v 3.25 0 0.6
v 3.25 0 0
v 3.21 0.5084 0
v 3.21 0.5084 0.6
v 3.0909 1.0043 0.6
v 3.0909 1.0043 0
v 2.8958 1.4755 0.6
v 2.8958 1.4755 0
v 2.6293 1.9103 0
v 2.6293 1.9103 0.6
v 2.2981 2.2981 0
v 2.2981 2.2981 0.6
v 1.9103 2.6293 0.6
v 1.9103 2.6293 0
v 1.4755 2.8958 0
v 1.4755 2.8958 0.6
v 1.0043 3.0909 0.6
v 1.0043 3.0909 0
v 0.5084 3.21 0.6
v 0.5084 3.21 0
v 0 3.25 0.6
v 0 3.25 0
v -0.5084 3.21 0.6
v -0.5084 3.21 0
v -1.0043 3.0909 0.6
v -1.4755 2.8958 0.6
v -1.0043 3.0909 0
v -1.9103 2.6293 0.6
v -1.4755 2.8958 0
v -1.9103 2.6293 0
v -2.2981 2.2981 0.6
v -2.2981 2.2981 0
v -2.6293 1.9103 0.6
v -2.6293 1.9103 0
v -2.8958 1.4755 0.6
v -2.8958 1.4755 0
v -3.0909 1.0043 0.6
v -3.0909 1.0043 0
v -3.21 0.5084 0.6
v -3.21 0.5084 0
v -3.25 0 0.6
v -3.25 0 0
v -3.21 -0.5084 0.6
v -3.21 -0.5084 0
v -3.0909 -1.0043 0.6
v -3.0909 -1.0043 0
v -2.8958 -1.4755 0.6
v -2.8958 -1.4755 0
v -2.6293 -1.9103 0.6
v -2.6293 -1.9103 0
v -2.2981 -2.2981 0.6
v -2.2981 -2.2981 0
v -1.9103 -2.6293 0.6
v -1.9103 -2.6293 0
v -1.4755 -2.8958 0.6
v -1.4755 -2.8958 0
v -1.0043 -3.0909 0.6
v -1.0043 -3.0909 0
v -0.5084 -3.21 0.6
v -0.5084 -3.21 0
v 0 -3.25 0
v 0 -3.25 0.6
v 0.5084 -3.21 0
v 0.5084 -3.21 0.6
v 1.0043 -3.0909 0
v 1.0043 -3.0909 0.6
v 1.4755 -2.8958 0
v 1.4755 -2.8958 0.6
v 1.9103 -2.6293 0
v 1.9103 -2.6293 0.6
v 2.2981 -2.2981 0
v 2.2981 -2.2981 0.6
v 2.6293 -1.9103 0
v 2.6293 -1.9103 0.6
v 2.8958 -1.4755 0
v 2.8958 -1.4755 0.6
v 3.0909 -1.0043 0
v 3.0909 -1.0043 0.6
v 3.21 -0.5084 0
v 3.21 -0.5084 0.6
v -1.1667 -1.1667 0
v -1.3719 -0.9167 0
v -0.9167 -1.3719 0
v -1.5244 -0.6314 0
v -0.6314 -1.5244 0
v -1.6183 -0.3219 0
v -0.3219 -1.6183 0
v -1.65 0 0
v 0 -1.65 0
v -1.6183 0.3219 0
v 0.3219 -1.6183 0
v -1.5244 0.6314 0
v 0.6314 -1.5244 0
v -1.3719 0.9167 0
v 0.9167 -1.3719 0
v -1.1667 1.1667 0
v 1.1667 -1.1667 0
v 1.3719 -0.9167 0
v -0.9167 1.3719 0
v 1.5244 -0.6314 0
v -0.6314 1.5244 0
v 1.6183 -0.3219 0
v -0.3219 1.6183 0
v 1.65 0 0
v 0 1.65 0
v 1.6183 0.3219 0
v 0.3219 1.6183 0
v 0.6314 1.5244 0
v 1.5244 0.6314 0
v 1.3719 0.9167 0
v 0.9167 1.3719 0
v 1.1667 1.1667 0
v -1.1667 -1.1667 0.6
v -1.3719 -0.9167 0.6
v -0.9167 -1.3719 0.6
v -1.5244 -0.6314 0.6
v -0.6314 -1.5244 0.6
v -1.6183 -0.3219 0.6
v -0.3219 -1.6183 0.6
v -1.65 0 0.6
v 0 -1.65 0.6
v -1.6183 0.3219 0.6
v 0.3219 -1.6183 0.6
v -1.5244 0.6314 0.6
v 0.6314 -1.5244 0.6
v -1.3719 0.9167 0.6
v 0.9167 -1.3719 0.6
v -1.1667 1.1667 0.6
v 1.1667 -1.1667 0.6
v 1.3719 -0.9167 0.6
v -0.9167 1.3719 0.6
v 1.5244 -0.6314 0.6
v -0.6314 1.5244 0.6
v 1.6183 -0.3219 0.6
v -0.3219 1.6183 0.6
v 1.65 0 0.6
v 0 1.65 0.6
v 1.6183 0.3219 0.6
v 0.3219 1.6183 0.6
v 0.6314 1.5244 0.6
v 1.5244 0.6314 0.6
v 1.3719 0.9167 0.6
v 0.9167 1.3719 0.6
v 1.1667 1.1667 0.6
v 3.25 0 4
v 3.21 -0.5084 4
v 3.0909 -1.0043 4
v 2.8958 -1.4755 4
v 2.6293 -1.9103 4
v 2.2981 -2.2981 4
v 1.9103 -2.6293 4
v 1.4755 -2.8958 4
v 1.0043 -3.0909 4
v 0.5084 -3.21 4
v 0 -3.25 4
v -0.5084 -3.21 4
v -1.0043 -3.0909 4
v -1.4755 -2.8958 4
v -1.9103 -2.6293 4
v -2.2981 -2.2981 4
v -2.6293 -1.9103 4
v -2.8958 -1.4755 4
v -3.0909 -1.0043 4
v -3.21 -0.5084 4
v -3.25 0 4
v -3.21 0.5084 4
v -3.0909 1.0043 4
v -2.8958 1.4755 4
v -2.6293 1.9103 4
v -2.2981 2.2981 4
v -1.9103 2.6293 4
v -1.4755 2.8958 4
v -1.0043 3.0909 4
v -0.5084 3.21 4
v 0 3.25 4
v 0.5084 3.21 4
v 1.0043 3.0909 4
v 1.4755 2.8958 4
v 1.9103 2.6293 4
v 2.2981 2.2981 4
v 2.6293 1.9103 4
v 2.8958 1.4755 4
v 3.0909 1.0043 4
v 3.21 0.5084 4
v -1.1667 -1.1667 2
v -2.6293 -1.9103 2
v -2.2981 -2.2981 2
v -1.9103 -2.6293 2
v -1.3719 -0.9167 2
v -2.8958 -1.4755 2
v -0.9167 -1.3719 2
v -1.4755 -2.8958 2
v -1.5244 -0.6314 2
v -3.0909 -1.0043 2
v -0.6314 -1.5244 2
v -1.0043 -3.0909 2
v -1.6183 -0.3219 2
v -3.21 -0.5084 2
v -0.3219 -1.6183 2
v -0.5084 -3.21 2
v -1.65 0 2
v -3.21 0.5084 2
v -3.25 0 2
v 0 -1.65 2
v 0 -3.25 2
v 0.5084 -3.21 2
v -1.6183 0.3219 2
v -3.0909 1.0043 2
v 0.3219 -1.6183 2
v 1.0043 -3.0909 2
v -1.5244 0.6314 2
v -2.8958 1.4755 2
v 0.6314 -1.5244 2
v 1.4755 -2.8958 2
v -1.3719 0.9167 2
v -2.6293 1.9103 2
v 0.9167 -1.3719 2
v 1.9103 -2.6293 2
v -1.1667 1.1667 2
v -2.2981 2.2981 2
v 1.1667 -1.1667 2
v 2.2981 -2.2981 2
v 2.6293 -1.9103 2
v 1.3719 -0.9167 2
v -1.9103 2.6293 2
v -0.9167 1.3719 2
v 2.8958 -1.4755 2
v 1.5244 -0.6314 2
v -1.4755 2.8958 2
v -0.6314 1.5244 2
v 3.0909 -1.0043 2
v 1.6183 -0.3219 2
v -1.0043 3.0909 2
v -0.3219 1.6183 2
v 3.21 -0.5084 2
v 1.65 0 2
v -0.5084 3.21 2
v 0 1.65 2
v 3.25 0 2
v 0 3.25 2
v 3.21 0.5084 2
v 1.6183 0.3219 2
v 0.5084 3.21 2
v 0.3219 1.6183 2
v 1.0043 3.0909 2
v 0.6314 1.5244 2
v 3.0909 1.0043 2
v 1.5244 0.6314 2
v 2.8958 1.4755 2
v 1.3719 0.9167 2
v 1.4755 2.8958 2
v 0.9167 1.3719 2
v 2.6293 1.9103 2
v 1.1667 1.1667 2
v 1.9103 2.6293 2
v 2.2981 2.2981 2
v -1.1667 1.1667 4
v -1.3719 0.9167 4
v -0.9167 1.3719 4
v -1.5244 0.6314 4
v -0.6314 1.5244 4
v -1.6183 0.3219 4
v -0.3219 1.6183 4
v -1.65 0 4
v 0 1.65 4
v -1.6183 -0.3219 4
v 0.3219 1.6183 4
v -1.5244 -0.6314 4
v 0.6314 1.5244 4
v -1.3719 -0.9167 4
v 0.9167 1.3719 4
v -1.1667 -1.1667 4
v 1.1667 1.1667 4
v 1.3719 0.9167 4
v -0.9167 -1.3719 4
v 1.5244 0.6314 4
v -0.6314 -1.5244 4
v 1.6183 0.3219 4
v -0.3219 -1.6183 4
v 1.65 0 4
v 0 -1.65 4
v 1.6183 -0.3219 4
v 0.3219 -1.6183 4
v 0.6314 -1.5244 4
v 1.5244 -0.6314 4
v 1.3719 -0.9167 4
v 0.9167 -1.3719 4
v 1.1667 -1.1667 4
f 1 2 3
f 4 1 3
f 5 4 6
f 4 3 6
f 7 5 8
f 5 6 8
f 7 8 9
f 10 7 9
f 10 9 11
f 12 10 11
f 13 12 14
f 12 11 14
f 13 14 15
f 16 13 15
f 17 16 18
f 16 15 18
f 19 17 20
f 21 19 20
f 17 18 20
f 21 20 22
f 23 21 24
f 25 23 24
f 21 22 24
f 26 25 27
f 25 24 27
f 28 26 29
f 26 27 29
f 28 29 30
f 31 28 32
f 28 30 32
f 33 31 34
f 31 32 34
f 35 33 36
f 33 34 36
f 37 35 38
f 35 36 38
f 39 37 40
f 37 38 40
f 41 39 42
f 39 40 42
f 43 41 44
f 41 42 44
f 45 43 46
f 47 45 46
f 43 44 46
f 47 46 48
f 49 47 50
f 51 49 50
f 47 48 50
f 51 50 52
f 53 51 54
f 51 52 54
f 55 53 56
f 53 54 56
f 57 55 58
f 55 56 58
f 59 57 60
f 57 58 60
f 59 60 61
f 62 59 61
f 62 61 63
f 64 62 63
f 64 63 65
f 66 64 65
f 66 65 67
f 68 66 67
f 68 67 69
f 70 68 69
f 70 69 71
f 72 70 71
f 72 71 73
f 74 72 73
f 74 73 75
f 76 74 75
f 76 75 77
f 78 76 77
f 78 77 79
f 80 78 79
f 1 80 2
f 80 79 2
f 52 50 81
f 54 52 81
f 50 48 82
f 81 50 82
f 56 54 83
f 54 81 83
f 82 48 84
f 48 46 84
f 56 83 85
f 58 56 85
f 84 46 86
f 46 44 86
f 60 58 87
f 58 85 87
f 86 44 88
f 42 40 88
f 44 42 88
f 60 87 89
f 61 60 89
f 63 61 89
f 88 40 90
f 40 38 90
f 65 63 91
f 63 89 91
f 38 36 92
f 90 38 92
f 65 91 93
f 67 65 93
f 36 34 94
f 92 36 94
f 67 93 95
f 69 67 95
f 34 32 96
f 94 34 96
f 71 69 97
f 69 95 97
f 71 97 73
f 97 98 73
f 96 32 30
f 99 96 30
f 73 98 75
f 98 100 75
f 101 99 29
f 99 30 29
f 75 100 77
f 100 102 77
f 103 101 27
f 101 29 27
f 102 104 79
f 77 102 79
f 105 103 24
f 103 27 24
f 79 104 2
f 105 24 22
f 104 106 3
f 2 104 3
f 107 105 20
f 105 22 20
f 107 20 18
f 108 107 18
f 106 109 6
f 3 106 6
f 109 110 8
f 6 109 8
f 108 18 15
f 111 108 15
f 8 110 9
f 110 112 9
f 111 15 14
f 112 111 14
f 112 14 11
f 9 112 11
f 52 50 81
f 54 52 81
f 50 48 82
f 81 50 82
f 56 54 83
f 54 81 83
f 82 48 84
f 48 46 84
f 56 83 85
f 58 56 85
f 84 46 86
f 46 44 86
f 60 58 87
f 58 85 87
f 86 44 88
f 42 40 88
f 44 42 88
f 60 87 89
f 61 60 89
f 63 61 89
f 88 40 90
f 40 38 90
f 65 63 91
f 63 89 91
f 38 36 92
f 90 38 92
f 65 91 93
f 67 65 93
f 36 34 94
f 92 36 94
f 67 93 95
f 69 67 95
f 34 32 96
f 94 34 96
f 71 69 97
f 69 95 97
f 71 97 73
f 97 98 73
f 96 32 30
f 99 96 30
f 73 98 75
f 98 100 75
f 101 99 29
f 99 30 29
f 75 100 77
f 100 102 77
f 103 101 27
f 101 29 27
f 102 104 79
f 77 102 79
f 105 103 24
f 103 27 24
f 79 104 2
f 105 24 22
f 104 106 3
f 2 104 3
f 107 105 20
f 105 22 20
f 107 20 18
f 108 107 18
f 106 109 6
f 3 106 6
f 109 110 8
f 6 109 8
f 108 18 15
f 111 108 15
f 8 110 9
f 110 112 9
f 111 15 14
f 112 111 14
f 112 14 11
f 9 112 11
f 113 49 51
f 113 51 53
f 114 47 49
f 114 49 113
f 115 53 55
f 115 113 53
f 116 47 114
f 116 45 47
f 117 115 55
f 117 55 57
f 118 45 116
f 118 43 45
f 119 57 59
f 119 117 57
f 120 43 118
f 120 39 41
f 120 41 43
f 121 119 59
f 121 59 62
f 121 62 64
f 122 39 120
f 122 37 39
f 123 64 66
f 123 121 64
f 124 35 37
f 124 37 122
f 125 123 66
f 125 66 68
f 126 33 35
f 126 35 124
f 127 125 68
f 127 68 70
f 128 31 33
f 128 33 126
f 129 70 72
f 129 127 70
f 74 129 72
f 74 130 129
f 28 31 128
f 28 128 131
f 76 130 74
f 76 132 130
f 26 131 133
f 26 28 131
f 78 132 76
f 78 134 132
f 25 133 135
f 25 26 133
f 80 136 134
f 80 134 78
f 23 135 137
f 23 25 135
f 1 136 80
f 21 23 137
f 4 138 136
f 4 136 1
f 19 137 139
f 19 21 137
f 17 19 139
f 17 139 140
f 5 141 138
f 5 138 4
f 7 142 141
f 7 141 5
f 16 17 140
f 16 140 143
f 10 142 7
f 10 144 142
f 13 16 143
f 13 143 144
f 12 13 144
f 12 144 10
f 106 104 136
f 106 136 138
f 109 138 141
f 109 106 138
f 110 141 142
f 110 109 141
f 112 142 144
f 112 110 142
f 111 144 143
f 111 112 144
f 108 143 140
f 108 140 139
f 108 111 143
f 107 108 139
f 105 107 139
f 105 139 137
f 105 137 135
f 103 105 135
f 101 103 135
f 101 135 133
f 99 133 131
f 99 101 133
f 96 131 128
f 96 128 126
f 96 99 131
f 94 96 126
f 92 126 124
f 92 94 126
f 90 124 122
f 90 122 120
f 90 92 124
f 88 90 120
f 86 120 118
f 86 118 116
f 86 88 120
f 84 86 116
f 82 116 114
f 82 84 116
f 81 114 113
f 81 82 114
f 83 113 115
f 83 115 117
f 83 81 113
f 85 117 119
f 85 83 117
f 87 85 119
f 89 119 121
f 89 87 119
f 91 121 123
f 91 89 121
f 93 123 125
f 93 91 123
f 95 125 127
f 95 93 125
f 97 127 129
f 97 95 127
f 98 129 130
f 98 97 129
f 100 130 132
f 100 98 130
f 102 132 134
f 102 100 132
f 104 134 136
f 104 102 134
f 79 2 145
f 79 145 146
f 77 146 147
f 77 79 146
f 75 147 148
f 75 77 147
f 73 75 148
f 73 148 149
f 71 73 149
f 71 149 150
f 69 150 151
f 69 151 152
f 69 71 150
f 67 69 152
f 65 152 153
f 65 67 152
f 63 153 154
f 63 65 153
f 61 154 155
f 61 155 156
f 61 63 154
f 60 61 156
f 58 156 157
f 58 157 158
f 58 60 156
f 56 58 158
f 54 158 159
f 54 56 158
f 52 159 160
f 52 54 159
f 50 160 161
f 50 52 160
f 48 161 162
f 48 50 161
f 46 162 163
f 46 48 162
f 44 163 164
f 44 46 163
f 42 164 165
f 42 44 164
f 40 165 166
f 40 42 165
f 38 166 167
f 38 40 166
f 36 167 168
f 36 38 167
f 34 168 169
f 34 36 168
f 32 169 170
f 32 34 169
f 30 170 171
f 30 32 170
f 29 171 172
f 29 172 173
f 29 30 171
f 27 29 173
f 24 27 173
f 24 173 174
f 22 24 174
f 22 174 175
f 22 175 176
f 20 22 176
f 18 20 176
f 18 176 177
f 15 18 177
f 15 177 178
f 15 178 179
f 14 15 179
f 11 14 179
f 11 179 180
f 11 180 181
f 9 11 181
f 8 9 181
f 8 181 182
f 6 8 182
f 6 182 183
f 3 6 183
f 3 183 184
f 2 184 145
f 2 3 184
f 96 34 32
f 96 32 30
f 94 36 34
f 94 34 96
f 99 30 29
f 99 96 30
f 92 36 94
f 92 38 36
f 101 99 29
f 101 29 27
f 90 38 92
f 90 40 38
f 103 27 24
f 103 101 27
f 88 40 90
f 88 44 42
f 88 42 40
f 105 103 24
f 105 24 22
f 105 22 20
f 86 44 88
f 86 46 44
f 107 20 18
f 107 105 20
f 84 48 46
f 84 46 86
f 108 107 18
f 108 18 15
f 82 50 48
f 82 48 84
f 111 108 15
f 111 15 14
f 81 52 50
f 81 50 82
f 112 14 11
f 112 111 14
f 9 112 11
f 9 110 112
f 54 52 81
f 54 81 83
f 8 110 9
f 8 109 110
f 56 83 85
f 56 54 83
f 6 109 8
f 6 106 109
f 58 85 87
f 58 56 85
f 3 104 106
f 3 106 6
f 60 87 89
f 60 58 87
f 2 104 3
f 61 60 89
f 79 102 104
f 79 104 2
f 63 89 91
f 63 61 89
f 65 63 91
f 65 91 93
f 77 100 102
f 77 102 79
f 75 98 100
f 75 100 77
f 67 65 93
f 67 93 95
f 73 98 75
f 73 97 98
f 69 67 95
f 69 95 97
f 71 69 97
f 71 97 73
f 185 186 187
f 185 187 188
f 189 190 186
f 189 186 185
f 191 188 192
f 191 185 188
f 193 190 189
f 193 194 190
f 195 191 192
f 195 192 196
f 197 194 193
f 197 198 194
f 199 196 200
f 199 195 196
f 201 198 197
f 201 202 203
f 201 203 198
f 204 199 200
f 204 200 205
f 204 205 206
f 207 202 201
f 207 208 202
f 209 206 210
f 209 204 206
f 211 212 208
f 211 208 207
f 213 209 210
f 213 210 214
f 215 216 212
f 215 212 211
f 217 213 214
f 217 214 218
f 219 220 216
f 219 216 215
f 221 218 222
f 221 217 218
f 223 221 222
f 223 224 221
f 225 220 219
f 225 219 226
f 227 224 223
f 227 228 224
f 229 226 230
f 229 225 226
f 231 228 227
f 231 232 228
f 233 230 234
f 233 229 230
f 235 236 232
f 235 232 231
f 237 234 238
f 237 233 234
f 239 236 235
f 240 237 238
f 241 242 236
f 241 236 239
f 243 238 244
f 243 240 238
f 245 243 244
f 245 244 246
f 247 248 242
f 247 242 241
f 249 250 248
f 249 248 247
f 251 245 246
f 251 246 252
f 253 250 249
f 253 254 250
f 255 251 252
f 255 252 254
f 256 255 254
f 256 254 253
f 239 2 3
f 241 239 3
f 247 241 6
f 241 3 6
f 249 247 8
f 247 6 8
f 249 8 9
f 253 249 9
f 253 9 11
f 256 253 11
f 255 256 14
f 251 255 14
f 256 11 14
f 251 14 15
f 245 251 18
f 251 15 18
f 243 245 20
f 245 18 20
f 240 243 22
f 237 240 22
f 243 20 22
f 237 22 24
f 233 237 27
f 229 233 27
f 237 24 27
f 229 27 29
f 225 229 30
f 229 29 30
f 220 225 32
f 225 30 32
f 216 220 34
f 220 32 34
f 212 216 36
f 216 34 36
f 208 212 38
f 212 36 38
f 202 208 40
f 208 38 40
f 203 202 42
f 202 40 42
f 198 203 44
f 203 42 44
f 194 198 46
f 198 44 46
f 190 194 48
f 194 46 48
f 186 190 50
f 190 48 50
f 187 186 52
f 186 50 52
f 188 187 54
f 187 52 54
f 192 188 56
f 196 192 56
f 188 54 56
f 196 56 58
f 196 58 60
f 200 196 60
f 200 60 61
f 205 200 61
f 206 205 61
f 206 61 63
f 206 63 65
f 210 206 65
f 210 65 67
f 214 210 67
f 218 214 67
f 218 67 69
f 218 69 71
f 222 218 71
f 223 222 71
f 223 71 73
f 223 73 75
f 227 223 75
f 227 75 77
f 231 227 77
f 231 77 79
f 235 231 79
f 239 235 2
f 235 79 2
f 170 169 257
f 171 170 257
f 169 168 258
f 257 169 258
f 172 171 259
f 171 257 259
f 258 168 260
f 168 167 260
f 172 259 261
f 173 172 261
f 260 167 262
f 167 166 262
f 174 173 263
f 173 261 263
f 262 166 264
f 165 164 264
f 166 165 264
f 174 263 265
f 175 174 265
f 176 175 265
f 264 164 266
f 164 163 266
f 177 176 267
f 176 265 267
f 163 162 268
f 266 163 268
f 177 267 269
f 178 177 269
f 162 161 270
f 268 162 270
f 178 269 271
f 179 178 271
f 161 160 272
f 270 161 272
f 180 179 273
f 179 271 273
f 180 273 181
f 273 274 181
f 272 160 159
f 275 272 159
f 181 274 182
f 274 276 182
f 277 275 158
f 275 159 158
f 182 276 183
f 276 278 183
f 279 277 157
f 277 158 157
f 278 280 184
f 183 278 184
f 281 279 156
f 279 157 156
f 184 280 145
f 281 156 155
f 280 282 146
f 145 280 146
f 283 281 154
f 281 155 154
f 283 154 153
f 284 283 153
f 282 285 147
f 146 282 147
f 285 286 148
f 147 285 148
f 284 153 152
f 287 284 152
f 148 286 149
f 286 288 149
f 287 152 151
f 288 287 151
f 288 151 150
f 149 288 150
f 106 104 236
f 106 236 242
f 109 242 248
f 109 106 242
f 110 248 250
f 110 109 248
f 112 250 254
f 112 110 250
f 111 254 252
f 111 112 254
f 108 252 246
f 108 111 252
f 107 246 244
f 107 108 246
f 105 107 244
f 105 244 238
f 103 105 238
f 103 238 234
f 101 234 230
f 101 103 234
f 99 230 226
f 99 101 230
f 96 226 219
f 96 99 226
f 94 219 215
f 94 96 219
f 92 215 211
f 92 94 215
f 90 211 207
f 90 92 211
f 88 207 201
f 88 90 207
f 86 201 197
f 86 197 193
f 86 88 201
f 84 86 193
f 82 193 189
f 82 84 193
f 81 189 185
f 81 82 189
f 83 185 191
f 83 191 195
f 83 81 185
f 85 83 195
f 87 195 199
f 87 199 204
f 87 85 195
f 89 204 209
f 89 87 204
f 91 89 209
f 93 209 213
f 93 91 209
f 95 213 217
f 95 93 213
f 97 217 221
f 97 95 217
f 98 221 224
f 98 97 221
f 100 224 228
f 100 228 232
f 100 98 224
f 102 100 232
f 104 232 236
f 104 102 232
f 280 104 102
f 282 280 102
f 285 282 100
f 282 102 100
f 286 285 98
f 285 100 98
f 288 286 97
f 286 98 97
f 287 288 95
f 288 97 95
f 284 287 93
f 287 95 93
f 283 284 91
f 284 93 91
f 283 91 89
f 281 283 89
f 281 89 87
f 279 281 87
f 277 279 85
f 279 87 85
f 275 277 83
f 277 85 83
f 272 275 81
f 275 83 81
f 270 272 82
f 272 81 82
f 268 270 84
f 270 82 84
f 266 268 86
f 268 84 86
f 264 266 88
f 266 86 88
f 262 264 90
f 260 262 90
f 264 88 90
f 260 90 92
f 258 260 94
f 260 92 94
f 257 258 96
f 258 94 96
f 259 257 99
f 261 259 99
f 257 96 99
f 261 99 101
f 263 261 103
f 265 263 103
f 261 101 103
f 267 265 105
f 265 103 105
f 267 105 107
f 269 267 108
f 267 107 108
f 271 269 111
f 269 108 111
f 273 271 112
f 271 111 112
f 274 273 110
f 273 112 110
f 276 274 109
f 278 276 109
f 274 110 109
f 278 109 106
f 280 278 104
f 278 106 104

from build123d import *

# Parameters (mm, degrees)
F0_R        = 3.25
F0_R_2      = 1.65
F1_DEPTH    = 0.6
F2_DEPTH    = 2
F2_FACE_R   = 3.25
F2_FACE_R_2 = 1.65
F3_DEPTH    = 4


with BuildPart() as f1:
    # F0 (on Top) → F1 (new body)
    with BuildSketch(Plane.XY):
        Circle(F0_R)
        Circle(F0_R_2, mode=Mode.SUBTRACT)
    extrude(amount=F1_DEPTH)


with BuildPart() as f2:
    # F0 (on Top) → F2 (new body)
    with BuildSketch(Plane.XY):
        Circle(F0_R)
        Circle(F0_R_2, mode=Mode.SUBTRACT)
    extrude(amount=F2_DEPTH)


with BuildPart() as f3:
    # F2_face (on face) → F3 (new body)
    with BuildSketch(Plane(origin=(0, 0, 0), x_dir=(1, 0, 0), z_dir=(0, 0, -1))):
        Circle(F2_FACE_R)
        Circle(F2_FACE_R_2, mode=Mode.SUBTRACT)
    extrude(amount=-F3_DEPTH)


solid = Compound([f1.part, f2.part, f3.part])
